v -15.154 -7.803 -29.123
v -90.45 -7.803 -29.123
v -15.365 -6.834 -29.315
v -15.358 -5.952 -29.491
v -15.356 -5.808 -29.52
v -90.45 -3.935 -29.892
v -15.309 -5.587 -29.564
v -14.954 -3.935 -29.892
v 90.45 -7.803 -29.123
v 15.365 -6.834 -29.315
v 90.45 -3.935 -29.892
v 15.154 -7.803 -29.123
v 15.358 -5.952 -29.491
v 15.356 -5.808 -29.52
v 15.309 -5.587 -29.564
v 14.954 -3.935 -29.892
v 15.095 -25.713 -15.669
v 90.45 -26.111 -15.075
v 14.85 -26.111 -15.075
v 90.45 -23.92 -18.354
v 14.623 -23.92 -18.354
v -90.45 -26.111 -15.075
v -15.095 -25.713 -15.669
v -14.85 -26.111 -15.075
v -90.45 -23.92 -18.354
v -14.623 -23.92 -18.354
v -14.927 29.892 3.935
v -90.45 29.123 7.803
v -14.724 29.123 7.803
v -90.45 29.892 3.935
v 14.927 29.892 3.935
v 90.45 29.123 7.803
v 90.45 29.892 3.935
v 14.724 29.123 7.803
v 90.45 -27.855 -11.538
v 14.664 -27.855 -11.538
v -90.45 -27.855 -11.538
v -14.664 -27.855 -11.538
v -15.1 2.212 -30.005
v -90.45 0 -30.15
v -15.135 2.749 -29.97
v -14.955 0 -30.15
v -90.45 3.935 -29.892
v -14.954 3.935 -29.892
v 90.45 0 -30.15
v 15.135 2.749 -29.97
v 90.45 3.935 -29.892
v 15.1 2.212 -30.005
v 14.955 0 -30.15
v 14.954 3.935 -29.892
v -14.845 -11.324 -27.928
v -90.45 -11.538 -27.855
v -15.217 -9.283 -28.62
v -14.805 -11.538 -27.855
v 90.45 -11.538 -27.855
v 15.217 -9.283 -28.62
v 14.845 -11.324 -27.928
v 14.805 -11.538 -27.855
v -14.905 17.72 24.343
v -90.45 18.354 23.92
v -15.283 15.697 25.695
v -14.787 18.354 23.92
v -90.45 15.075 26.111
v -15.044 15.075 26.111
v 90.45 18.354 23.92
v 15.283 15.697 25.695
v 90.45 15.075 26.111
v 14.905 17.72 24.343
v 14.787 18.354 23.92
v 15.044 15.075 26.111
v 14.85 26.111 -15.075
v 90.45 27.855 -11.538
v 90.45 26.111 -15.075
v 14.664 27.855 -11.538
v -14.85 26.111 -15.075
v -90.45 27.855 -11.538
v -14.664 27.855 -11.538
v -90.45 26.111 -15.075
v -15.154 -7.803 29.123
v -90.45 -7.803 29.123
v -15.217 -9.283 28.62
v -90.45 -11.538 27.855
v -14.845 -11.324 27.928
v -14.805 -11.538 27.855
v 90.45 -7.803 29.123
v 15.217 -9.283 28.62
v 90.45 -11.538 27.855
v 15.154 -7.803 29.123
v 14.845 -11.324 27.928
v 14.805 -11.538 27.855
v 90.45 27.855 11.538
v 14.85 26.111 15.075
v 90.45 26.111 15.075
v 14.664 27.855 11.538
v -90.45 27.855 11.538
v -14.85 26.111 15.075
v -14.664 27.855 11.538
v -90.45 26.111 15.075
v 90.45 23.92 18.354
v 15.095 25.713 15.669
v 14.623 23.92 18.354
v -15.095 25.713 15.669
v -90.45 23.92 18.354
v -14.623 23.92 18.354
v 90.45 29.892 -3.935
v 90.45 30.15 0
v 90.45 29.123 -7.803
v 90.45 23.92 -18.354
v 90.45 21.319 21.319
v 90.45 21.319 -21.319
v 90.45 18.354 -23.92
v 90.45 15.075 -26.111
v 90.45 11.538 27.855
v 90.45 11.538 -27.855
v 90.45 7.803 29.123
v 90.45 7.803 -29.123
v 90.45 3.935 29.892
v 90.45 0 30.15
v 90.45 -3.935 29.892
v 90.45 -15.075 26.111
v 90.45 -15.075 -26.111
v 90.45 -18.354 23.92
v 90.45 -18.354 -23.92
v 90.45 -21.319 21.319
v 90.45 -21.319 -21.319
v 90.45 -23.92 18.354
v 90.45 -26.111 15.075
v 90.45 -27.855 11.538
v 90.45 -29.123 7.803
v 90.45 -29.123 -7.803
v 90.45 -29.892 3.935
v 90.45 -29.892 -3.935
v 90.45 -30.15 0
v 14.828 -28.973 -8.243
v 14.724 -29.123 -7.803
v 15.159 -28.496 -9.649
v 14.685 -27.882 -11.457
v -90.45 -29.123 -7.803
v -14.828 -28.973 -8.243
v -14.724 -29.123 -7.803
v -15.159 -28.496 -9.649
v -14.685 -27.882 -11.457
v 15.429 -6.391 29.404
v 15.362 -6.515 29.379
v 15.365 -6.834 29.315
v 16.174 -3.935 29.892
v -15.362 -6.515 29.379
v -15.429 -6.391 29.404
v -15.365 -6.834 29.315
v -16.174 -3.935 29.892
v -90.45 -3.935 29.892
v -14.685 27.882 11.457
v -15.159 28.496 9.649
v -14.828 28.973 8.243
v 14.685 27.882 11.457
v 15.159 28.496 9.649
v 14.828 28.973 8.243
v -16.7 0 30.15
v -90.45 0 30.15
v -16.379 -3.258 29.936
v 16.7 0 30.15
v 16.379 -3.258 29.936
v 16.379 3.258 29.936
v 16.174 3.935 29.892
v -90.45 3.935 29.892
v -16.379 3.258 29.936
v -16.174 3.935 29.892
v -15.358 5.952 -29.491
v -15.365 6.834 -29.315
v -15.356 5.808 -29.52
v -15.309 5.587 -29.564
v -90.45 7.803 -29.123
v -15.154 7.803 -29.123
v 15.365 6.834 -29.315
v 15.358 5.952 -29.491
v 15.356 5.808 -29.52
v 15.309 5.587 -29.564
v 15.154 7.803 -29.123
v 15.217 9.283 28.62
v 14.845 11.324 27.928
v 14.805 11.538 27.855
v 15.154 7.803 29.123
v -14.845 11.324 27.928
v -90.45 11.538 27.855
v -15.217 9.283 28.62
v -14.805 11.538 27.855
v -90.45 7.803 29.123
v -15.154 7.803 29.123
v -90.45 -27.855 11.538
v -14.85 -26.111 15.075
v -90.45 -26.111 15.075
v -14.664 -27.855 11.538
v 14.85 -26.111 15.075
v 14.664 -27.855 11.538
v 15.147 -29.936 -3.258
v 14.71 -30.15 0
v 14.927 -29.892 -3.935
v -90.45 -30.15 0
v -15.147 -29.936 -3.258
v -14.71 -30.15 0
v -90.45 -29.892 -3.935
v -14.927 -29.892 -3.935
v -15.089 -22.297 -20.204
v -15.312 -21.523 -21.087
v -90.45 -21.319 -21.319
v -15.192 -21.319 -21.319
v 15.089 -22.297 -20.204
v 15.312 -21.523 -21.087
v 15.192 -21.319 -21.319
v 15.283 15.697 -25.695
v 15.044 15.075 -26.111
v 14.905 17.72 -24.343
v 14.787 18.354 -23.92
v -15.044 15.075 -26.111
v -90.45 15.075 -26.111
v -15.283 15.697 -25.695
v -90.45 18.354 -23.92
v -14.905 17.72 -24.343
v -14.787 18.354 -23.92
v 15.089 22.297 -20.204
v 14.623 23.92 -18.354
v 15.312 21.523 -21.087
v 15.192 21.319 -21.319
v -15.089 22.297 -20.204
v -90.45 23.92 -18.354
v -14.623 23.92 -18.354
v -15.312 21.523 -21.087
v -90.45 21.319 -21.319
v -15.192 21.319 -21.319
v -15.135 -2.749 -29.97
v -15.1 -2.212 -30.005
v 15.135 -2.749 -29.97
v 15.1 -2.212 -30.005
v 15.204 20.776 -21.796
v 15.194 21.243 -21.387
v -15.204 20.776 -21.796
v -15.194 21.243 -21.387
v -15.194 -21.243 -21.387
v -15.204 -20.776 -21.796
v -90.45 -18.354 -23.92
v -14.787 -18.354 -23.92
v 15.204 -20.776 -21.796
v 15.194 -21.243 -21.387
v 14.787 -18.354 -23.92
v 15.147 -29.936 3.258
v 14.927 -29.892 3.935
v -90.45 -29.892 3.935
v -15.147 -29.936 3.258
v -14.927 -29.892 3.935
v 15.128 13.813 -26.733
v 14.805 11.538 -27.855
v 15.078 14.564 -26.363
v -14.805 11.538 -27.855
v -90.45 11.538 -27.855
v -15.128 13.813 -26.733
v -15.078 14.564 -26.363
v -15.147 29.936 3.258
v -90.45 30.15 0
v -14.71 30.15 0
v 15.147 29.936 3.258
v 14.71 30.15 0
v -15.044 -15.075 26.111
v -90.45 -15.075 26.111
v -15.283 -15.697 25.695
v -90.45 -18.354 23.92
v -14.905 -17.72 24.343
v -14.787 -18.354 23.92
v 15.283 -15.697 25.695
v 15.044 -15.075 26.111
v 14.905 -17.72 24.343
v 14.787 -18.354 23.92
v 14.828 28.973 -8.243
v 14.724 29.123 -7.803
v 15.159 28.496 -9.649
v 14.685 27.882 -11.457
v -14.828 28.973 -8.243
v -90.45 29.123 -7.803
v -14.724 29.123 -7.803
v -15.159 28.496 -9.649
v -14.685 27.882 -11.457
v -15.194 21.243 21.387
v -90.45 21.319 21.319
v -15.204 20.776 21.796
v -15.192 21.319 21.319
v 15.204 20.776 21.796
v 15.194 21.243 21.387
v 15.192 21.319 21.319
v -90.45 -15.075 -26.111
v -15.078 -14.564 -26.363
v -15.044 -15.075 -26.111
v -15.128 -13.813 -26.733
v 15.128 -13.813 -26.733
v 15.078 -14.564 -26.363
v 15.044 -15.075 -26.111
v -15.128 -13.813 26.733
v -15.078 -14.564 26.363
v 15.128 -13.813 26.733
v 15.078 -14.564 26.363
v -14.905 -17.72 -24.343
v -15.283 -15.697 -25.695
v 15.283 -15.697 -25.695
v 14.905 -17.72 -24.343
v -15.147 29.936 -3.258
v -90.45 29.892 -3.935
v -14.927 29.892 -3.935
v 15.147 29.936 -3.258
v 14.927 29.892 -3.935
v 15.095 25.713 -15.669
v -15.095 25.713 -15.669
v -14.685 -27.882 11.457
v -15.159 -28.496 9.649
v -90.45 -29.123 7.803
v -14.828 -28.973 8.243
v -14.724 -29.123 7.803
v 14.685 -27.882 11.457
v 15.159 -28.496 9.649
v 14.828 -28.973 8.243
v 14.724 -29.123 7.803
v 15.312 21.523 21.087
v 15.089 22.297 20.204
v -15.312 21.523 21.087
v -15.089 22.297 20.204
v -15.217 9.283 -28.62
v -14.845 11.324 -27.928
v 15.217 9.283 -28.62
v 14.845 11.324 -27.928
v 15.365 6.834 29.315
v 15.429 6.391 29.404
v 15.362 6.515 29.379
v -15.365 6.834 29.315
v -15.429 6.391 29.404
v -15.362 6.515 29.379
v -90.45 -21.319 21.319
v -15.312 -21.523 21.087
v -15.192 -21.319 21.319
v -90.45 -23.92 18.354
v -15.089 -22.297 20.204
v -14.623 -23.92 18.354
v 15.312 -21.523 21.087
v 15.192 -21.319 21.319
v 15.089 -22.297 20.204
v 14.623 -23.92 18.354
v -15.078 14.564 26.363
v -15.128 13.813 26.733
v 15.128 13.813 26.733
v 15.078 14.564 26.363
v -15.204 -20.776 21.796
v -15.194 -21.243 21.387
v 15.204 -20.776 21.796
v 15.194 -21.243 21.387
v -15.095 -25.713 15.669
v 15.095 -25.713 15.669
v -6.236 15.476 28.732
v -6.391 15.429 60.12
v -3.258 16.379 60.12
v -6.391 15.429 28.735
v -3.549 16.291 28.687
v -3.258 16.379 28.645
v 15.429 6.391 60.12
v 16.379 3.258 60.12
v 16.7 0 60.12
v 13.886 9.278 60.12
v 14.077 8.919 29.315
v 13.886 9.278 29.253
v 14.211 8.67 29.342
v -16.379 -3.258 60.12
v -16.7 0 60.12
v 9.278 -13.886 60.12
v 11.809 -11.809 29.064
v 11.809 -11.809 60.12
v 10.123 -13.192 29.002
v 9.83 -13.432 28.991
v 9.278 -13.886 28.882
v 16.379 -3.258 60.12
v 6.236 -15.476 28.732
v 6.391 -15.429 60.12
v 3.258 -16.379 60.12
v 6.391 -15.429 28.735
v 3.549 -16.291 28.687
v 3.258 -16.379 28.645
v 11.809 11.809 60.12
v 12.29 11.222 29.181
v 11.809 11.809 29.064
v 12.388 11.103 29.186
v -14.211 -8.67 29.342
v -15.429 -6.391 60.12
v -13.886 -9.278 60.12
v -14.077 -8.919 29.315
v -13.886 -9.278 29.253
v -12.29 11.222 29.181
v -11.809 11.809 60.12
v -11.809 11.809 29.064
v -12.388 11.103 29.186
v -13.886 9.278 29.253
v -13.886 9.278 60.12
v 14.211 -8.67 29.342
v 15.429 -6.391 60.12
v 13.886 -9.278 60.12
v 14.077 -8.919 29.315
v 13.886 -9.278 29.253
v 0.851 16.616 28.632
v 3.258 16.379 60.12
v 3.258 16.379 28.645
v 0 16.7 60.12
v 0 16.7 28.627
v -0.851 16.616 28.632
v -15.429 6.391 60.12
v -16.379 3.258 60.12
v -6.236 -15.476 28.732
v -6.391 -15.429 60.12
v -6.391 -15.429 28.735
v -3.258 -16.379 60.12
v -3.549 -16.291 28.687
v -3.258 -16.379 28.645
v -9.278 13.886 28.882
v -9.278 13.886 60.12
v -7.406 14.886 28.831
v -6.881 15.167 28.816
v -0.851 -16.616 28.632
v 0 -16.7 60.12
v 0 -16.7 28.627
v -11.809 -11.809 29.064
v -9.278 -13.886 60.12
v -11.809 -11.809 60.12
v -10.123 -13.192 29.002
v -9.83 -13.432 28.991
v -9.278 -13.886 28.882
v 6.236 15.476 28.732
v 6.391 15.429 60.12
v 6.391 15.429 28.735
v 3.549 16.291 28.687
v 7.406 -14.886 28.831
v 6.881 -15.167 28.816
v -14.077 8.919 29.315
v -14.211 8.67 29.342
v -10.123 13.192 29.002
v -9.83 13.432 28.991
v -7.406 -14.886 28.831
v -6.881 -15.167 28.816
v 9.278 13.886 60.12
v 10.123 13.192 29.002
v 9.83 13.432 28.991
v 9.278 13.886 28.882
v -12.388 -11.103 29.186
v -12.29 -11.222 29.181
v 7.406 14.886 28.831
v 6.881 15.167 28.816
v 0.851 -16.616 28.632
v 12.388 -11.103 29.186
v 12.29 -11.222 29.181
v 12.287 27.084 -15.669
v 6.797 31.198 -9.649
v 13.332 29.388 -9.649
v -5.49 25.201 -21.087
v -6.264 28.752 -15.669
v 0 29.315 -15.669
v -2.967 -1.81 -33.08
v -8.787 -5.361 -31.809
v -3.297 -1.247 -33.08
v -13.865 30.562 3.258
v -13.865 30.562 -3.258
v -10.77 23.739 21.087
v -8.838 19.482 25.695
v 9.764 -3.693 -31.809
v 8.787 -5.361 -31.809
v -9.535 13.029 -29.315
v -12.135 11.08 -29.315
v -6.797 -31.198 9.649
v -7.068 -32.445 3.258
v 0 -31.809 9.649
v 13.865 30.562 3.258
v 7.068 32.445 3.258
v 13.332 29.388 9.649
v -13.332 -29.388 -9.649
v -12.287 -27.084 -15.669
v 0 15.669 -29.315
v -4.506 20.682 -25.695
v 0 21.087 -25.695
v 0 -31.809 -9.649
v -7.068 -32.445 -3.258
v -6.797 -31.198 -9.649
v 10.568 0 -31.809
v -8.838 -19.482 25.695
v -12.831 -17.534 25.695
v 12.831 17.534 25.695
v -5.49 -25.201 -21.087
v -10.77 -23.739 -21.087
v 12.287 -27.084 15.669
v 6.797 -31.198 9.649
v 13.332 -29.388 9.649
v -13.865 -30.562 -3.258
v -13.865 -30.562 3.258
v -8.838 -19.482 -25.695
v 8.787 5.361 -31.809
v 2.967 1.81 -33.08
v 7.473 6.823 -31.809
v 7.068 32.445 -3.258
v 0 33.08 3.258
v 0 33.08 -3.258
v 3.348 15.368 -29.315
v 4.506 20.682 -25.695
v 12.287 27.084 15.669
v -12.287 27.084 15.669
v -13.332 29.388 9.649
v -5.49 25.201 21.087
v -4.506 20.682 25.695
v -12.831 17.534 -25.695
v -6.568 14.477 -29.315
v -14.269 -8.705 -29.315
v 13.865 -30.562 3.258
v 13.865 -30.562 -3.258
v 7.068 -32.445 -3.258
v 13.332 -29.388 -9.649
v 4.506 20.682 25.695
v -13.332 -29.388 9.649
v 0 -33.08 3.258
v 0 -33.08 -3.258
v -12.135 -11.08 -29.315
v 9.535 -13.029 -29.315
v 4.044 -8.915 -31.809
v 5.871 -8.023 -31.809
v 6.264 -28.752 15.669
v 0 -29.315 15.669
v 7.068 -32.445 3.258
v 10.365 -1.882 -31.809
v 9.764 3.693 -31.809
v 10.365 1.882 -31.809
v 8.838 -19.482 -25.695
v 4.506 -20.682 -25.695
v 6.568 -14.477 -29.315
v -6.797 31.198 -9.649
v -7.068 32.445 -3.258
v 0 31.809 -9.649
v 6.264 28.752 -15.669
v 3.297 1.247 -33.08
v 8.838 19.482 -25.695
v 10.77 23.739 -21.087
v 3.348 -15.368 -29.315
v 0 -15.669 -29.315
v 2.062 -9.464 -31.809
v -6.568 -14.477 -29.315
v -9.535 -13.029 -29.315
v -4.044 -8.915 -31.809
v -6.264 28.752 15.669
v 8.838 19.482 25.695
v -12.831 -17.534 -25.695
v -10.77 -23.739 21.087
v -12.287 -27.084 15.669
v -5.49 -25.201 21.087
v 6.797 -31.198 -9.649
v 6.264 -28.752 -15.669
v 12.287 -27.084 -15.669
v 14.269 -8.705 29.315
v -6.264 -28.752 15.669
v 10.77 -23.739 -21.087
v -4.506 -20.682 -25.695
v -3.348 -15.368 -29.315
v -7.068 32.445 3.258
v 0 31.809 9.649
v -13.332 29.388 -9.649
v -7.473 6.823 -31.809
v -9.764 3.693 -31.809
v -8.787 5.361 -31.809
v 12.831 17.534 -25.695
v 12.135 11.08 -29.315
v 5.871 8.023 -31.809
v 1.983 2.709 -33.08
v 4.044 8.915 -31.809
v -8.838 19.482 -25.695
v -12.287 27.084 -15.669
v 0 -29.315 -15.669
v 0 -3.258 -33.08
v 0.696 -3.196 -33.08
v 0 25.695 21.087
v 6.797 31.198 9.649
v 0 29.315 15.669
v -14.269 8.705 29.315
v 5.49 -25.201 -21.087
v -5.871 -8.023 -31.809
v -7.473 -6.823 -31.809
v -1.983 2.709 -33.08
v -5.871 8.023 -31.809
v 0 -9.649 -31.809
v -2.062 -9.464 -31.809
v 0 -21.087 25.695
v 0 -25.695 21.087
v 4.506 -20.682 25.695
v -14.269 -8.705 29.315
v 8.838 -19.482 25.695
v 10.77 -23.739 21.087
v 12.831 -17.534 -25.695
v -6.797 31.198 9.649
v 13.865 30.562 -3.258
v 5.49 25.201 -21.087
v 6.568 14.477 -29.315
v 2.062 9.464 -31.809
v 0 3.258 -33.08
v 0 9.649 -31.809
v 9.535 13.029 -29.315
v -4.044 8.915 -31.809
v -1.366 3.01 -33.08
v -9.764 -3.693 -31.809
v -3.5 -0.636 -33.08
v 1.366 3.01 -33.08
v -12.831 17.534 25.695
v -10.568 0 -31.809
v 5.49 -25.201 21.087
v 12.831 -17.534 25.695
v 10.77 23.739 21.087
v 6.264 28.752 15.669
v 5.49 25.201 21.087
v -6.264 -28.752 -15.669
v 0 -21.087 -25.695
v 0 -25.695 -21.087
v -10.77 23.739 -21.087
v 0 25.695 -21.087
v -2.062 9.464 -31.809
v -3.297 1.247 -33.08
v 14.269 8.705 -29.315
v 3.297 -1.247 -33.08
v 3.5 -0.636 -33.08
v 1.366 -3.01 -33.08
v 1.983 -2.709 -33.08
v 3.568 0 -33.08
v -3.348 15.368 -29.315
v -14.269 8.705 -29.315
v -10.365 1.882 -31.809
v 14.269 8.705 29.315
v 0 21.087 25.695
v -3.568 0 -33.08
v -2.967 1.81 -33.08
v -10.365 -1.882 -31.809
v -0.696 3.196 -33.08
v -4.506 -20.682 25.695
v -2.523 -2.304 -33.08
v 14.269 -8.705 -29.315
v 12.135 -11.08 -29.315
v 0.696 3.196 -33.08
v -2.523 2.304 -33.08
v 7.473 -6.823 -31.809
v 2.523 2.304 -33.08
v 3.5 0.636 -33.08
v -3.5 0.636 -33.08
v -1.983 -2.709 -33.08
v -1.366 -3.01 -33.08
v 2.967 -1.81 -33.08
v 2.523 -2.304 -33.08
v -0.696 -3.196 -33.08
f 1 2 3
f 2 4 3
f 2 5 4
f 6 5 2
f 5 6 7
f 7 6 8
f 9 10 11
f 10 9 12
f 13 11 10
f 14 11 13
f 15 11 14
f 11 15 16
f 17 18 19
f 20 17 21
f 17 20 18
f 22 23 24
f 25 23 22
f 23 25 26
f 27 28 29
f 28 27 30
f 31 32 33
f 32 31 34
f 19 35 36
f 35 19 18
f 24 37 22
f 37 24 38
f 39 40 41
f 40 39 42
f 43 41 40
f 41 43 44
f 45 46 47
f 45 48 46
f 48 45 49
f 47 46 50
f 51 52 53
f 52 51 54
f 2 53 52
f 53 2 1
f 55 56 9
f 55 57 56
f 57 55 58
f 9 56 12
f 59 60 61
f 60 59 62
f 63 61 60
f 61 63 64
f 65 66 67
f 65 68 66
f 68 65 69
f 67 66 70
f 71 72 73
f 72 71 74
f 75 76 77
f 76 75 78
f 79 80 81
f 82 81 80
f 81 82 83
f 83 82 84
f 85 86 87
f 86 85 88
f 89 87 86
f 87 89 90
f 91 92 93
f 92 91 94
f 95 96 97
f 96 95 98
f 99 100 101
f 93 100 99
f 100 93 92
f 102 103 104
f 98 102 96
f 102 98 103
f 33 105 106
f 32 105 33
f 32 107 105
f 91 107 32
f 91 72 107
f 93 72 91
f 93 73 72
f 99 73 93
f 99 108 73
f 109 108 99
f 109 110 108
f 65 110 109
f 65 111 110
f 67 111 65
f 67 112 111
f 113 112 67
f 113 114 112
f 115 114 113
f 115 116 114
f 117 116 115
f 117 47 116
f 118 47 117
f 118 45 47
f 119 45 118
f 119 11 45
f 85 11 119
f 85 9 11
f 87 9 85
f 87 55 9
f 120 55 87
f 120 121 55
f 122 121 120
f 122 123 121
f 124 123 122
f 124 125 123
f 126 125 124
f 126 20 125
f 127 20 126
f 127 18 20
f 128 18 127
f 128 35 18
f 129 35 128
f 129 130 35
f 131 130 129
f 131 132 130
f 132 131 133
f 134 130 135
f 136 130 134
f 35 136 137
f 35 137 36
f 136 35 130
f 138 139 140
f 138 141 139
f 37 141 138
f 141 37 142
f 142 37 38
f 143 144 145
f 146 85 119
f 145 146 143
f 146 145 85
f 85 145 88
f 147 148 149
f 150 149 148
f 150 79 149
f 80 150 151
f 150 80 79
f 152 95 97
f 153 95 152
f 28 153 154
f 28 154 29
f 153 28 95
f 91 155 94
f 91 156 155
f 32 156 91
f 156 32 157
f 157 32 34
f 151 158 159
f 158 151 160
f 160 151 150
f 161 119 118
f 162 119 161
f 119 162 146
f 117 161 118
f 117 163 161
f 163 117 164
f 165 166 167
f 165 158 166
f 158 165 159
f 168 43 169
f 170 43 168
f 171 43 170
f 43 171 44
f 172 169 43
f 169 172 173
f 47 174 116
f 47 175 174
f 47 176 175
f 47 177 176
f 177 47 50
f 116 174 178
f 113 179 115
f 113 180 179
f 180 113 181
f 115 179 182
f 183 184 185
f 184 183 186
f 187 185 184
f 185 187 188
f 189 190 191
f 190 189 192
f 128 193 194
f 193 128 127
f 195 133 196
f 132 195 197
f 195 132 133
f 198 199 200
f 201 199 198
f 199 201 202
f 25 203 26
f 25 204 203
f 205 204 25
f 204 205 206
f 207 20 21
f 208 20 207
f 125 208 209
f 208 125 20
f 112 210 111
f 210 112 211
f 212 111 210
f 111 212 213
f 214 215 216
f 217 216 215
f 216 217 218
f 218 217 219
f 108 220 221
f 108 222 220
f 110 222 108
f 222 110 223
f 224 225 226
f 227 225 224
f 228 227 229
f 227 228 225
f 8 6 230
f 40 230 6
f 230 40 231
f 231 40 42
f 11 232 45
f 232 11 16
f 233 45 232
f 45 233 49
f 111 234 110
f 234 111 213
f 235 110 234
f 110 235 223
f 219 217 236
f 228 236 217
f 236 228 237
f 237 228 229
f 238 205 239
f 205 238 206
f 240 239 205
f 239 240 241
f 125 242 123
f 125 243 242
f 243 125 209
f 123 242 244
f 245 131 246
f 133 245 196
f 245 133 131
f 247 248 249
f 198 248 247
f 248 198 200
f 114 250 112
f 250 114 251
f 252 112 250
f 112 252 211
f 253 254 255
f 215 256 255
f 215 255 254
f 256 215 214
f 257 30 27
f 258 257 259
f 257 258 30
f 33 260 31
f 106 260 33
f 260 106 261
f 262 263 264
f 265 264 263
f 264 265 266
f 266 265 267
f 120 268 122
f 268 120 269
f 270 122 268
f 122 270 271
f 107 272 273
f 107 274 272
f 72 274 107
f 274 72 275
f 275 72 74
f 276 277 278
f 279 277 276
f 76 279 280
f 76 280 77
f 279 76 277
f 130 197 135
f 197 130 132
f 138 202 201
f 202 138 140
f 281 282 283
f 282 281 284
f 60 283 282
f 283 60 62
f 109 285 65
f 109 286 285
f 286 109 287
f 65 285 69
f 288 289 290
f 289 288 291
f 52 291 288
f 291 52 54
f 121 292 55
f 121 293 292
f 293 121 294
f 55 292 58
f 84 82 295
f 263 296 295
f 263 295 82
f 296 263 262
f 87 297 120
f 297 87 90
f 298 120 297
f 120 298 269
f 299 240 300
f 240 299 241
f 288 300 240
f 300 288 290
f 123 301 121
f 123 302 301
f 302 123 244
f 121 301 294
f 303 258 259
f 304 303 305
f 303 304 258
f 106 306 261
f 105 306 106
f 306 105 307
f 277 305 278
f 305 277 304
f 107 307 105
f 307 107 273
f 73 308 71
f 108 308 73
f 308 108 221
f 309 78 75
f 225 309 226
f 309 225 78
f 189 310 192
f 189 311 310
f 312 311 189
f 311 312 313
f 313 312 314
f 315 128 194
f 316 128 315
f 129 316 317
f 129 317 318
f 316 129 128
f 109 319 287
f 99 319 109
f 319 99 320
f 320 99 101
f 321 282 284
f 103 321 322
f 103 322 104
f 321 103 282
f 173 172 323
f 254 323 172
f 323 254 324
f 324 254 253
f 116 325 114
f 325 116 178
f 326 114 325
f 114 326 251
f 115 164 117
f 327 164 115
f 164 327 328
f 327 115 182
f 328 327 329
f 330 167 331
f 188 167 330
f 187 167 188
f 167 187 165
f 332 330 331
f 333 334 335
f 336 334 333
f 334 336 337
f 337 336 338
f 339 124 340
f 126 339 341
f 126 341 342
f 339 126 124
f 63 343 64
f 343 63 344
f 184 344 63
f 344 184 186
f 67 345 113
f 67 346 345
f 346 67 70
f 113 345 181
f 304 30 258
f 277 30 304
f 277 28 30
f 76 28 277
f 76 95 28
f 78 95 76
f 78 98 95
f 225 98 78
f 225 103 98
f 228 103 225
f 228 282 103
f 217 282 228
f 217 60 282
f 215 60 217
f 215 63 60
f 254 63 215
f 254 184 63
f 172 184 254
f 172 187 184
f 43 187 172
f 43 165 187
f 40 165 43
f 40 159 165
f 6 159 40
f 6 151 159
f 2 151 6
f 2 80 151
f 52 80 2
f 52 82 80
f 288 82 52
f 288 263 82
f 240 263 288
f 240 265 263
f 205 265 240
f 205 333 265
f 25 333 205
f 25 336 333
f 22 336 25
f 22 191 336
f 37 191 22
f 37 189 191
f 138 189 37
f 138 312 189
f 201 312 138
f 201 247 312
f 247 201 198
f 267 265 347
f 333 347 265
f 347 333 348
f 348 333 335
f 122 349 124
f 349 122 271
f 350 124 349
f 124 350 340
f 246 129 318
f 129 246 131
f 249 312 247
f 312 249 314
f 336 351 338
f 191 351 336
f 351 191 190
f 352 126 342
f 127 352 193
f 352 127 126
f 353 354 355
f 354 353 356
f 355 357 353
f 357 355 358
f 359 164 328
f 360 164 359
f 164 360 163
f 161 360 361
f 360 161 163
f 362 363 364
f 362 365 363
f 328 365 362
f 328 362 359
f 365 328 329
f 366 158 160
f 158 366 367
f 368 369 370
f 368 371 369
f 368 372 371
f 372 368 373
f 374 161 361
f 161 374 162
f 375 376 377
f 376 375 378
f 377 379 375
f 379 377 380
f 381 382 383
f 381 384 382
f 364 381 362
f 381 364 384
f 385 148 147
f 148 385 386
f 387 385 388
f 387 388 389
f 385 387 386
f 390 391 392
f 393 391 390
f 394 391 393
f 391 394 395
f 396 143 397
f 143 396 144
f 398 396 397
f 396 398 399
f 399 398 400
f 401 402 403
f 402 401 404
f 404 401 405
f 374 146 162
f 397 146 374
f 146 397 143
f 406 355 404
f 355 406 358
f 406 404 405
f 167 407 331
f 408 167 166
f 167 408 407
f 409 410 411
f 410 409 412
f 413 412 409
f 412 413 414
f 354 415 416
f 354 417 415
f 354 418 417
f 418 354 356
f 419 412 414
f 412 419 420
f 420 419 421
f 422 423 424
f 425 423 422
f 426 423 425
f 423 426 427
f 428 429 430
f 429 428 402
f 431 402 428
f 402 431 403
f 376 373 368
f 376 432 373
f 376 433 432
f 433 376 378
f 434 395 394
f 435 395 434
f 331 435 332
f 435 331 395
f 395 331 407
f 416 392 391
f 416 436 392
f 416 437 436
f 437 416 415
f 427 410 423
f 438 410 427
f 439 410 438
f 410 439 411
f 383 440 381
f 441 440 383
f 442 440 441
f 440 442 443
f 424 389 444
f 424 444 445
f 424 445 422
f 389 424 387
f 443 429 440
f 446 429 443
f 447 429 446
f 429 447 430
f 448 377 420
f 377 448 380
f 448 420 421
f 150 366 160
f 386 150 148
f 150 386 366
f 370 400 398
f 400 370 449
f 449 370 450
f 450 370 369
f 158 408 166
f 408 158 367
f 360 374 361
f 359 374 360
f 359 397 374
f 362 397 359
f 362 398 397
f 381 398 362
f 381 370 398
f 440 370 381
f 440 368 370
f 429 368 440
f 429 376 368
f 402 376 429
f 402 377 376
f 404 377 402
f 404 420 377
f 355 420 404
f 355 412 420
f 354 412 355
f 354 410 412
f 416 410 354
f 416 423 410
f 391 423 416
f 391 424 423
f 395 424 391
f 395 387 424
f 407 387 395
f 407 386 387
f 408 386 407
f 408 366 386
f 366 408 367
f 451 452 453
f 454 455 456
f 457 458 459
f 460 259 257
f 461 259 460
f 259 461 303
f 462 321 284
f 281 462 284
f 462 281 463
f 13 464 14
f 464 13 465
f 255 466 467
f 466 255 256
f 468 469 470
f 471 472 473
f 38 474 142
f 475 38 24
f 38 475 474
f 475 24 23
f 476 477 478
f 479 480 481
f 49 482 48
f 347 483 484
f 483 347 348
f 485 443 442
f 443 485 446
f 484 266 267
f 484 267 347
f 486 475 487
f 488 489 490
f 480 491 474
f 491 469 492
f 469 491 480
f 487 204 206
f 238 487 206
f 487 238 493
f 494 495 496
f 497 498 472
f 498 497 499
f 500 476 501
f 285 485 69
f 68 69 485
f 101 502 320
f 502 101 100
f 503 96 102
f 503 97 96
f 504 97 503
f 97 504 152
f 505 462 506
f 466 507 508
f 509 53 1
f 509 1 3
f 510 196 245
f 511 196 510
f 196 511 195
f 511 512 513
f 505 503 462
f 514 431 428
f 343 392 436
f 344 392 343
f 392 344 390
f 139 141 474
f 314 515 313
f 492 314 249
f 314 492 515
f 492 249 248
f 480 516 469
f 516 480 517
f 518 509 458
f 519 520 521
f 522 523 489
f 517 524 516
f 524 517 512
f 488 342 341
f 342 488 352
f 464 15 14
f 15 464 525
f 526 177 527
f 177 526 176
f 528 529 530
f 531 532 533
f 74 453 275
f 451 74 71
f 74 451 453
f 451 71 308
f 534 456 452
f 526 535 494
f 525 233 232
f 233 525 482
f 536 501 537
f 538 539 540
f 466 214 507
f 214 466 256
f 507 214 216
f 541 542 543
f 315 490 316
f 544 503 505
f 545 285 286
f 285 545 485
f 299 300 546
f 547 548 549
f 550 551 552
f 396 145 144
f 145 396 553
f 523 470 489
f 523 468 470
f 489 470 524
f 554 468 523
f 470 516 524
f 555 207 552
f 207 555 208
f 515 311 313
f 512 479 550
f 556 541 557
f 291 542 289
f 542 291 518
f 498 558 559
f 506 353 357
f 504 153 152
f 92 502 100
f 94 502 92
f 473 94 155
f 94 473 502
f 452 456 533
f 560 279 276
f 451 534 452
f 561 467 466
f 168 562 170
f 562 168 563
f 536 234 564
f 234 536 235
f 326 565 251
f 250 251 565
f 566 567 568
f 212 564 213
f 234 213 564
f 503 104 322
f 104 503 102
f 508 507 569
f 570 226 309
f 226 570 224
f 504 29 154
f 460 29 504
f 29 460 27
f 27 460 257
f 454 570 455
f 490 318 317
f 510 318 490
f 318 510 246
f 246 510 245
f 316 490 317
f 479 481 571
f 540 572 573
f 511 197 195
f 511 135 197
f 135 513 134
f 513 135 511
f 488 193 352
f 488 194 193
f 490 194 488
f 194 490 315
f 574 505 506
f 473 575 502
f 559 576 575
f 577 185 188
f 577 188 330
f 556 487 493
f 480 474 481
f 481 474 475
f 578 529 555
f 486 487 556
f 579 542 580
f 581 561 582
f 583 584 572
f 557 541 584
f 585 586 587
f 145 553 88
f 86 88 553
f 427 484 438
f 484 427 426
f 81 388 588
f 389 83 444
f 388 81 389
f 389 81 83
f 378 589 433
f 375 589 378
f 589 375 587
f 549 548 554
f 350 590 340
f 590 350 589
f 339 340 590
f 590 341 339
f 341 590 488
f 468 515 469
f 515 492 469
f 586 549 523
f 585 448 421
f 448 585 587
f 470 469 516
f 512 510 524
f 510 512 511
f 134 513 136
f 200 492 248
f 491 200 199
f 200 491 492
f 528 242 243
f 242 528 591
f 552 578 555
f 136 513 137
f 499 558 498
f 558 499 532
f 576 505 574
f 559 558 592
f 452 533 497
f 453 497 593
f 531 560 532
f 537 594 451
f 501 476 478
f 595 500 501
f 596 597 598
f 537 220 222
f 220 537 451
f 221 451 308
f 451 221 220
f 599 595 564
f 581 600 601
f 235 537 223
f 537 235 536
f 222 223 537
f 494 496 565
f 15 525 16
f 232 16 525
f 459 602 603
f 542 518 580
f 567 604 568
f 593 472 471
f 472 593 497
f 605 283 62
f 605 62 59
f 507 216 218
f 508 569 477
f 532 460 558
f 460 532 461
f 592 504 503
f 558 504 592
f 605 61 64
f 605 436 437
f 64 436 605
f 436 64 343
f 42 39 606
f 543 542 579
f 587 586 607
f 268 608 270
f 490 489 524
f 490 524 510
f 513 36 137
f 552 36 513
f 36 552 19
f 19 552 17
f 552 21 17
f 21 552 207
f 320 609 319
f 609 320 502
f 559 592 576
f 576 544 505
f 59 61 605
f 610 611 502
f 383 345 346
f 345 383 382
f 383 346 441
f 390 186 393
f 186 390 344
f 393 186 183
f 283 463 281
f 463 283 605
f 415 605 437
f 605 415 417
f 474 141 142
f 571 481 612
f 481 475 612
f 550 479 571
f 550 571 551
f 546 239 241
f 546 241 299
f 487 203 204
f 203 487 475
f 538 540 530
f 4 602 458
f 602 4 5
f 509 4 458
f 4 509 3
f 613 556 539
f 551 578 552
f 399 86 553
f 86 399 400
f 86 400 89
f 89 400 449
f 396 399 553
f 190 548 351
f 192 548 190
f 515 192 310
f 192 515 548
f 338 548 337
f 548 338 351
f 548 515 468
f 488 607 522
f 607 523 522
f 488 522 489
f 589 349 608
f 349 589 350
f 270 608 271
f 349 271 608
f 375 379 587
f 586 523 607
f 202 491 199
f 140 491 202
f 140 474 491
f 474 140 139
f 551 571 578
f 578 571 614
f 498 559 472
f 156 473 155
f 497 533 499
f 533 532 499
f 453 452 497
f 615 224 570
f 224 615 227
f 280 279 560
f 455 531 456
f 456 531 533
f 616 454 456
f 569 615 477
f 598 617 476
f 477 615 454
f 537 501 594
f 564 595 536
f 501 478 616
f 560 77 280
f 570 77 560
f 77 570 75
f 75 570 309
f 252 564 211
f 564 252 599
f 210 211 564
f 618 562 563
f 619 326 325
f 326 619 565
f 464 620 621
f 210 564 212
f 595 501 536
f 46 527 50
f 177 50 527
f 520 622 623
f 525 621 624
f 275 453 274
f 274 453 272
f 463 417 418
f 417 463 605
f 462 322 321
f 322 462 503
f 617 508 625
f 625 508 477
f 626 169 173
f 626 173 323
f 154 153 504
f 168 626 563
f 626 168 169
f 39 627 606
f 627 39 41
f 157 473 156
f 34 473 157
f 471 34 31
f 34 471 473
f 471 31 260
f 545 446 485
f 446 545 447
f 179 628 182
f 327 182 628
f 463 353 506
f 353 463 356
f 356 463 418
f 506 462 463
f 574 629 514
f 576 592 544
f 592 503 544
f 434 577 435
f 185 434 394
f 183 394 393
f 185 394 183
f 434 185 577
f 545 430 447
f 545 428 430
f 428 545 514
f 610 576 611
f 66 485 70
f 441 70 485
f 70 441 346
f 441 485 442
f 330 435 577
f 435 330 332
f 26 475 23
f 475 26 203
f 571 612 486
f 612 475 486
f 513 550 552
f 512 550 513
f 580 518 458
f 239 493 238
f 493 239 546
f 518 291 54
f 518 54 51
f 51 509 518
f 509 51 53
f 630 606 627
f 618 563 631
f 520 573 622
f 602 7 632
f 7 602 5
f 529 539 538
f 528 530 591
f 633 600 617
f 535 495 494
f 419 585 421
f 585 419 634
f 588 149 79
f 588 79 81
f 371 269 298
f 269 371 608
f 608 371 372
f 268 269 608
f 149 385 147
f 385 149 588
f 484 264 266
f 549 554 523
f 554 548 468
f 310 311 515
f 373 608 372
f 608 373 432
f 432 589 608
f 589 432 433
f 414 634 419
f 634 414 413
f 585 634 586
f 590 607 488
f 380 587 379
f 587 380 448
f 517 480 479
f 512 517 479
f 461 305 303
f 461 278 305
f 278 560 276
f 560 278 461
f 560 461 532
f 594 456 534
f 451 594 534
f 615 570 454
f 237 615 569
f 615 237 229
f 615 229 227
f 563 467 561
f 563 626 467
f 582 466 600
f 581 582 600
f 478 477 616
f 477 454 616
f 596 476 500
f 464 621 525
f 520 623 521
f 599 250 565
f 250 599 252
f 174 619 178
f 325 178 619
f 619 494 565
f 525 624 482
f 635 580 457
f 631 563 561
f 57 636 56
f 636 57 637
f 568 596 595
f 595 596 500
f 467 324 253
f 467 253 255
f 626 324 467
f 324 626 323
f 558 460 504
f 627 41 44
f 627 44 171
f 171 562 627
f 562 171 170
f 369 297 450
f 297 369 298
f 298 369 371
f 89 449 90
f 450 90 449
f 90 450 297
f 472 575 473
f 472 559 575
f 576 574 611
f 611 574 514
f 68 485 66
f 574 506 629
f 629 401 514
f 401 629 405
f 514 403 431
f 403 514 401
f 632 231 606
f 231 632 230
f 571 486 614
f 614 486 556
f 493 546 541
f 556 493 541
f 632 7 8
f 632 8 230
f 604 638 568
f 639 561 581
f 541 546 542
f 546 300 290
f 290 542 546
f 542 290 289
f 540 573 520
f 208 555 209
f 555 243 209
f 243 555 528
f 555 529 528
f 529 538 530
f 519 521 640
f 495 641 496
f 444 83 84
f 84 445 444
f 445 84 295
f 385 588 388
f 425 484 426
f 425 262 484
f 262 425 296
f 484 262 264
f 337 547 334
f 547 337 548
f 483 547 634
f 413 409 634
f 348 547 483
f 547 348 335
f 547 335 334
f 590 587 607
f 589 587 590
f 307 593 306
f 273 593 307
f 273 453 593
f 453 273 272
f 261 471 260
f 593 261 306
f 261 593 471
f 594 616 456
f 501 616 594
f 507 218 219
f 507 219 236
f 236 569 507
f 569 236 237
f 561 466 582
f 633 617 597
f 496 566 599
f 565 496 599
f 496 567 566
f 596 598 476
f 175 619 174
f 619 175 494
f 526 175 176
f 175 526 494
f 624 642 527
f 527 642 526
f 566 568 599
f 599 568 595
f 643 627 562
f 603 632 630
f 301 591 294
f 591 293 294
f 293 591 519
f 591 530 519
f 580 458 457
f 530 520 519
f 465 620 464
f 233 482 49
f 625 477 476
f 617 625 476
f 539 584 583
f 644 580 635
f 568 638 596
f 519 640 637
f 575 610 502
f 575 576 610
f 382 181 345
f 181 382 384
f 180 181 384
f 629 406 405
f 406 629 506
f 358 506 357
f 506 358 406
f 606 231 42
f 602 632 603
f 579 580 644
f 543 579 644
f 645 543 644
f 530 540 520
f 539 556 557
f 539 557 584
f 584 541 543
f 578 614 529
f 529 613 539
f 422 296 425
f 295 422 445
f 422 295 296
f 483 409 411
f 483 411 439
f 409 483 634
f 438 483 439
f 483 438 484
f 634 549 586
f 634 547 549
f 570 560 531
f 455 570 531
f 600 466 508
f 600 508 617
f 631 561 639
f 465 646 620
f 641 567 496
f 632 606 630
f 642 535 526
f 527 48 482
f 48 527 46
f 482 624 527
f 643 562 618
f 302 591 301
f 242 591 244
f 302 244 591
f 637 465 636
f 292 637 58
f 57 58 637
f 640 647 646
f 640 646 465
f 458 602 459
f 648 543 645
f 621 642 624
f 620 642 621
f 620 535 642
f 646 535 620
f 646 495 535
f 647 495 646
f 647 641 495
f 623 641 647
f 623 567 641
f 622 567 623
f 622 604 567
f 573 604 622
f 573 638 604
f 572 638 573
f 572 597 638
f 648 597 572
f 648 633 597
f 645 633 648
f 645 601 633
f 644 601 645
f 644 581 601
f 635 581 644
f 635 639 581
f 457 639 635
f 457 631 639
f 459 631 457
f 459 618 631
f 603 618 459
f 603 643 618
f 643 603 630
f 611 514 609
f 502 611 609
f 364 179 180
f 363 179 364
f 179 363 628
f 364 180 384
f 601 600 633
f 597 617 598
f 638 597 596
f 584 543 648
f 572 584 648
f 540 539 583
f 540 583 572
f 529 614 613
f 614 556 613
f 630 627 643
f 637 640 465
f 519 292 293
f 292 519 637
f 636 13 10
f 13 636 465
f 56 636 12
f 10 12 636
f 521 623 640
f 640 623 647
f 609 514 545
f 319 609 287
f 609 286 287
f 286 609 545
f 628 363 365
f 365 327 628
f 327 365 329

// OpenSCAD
// Reducing tee — 2" run, 1" branch.
run_od = 60.3;  // 2" NPS
branch_od = 33.4;  // 1" NPS
run_l = run_od * 3.0;
branch_l = branch_od * 1.8;
union() {
    rotate([0, 90, 0]) cylinder(h = run_l, d = run_od, center = true, $fn = 48);
    translate([0, 0, branch_l / 2])
        cylinder(h = branch_l, d = branch_od, center = true, $fn = 32);
    scale([1.15, 1.05, 1.05]) sphere(d = run_od * 1.05, $fn = 32);
}
